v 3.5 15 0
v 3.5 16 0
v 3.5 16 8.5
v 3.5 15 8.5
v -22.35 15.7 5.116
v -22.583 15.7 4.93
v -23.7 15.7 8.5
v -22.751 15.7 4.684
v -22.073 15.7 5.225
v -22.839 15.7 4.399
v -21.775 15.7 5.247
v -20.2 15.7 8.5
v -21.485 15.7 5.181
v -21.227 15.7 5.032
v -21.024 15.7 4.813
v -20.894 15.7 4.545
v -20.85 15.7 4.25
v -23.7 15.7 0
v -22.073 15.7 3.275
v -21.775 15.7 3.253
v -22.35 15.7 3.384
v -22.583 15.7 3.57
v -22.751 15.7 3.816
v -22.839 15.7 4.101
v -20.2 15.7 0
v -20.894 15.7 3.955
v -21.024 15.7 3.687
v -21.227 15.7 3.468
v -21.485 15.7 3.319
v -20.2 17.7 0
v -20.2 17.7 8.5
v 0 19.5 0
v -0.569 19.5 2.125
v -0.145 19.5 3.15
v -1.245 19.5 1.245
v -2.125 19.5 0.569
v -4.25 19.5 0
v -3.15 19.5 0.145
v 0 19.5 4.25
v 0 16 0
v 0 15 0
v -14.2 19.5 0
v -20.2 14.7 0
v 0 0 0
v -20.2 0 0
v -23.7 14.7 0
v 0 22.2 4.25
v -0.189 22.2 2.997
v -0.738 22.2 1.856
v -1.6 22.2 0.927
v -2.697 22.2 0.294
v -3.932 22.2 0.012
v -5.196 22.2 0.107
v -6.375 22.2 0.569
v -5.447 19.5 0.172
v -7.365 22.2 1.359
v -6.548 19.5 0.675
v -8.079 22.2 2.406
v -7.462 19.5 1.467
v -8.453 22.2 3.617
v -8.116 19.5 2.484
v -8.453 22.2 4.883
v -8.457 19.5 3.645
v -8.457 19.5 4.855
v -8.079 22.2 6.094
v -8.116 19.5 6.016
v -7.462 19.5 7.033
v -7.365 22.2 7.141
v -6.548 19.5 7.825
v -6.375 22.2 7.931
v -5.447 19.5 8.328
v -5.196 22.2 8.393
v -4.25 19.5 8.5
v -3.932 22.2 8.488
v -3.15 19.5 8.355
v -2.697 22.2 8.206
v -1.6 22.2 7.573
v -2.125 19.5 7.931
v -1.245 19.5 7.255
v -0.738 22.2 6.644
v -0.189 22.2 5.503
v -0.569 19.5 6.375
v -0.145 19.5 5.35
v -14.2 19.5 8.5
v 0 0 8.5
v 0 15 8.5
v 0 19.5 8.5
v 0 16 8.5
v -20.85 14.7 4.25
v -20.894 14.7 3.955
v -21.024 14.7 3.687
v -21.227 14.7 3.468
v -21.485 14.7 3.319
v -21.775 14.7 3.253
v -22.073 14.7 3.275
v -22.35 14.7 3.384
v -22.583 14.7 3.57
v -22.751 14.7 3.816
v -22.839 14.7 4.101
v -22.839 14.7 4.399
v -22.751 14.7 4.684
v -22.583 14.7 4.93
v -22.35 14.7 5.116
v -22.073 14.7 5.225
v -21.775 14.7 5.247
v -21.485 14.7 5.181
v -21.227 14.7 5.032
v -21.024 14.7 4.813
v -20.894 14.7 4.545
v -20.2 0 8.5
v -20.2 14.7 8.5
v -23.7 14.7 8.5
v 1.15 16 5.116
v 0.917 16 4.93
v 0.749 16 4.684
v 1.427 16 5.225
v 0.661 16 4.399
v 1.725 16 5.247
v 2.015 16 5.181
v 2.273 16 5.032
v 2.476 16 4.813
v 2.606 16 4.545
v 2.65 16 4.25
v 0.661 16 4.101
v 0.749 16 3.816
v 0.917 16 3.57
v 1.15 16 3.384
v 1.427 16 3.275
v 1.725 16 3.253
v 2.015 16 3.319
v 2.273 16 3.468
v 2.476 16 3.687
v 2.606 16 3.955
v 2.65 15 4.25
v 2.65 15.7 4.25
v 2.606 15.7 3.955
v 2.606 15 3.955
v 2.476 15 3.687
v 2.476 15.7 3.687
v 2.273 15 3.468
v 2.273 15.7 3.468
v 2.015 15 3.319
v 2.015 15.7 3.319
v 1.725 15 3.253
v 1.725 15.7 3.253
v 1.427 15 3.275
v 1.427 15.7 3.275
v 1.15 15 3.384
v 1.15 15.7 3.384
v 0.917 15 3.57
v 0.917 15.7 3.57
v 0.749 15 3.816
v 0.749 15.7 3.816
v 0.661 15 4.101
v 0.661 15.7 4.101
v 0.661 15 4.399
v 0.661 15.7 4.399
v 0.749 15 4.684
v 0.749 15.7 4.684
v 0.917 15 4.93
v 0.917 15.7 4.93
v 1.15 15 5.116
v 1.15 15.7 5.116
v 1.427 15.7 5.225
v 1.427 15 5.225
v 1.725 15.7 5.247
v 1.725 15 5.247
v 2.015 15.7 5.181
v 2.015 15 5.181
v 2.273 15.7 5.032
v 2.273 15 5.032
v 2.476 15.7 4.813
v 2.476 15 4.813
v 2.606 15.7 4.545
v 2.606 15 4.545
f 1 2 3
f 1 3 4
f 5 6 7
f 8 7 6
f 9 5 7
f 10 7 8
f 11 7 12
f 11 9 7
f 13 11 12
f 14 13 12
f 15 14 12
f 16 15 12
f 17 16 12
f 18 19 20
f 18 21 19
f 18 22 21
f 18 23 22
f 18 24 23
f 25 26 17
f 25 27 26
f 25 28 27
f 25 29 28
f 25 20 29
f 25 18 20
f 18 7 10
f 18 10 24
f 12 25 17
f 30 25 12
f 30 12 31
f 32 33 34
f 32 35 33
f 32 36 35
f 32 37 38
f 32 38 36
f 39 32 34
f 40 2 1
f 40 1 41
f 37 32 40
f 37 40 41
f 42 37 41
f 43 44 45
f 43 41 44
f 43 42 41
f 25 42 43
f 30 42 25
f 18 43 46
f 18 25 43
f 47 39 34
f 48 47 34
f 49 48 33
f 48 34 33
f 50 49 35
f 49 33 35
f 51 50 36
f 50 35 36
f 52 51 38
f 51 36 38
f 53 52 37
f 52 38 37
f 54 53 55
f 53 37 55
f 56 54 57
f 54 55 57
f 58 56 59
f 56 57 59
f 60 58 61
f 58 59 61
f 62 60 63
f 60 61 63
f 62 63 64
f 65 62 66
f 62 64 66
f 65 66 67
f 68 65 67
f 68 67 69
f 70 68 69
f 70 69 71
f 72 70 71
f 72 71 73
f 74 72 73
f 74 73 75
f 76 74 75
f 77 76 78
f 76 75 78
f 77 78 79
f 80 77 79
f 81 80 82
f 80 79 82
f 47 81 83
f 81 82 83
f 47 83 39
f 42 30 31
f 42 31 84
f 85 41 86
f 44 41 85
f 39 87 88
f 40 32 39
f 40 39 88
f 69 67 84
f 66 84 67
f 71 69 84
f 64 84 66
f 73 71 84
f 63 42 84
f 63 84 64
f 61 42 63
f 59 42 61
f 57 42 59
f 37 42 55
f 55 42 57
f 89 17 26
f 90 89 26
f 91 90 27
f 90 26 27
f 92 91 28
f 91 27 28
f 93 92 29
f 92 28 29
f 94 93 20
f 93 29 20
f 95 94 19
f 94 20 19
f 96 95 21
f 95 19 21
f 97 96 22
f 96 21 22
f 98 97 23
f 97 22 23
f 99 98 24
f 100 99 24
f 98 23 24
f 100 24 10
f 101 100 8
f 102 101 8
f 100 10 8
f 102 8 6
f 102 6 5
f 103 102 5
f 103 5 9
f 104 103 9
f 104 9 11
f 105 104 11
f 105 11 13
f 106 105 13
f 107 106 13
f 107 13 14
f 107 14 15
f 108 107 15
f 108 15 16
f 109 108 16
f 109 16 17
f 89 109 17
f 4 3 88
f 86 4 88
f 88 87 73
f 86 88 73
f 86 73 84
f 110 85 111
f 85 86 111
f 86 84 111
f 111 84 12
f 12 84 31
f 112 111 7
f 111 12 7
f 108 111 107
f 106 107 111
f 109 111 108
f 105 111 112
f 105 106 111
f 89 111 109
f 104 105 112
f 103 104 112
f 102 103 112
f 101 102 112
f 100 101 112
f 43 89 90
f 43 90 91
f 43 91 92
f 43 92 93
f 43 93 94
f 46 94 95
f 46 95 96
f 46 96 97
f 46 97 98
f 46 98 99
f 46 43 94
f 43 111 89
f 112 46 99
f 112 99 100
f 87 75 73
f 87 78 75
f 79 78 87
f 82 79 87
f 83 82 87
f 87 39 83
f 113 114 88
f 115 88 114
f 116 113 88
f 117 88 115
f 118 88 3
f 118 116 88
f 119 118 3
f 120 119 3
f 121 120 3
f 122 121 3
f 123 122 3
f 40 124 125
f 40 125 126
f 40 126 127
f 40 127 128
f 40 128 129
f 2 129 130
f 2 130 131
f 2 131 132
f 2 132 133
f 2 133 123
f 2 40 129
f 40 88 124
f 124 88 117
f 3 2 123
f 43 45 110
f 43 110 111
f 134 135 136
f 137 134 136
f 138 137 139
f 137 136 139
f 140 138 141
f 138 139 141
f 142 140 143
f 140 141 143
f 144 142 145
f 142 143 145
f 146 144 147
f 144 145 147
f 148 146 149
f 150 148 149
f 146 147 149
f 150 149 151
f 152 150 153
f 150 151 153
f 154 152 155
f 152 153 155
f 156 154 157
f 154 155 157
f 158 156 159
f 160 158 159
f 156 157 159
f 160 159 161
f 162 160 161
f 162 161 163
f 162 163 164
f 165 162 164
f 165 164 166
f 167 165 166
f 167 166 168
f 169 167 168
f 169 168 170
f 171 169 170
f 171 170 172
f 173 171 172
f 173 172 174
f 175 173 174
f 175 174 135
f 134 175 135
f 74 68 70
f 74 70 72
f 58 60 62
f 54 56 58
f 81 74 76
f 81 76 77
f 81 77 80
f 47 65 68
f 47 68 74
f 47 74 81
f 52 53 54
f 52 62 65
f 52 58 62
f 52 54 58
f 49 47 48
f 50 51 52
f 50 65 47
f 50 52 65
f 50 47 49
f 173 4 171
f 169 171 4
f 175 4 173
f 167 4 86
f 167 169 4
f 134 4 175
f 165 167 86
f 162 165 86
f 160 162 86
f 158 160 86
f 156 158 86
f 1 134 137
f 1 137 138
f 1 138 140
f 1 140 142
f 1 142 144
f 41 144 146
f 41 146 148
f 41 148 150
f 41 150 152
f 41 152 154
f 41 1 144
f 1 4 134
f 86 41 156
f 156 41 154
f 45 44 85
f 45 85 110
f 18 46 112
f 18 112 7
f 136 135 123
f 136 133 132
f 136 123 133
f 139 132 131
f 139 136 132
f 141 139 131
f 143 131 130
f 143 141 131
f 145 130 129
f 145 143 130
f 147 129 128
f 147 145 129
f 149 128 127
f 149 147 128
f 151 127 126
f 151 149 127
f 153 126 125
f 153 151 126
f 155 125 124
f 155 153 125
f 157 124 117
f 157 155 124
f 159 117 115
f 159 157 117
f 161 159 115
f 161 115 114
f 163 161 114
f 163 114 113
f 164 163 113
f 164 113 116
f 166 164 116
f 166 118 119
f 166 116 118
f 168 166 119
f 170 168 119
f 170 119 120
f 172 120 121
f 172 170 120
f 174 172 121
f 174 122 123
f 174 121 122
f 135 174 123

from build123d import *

# Parameters (mm, degrees)
BOSS_EXTRUDE1_DEPTH     = 8.5
SKETCH2_R               = 4.25
BOSS_EXTRUDE2_DEPTH     = 2.7
SKETCH3_R               = 1
CUT_EXTRUDE1_DEPTH      = 7.5
CUT_EXTRUDE1_DEPTH_BACK = 16.7


with BuildPart() as part:
    # Sketch1 → Boss-Extrude1 (new body)
    with BuildSketch(Plane.XY):
        Polygon((0, 0), (-20.2, 0), (-20.2, 14.7), (-23.7, 14.7), (-23.7, 15.7), (-20.2, 15.7), (-20.2, 17.7), (-14.2, 19.5), (0, 19.5), (0, 16), (3.5, 16), (3.5, 15), (0, 15), align=None)
    extrude(amount=BOSS_EXTRUDE1_DEPTH)

    # Sketch2 → Boss-Extrude2 (add)
    with BuildSketch(Plane(origin=(0, 19.5, 0), x_dir=(1, 0, 0), z_dir=(0, 1, 0))):
        with Locations((-4.25, -4.25)):
            Circle(SKETCH2_R)
    extrude(amount=BOSS_EXTRUDE2_DEPTH)

    # Sketch3 → Cut-Extrude1 (cut, two sides)
    with BuildSketch(Plane(origin=(0, 15.7, 0), x_dir=(1, 0, 0), z_dir=(0, 1, 0))) as cut_extrude1_sk:
        with Locations((-21.85, -4.25)):
            Circle(SKETCH3_R)
        with Locations((1.65, -4.25)):
            Circle(SKETCH3_R)
    extrude(amount=CUT_EXTRUDE1_DEPTH, mode=Mode.SUBTRACT)
    extrude(cut_extrude1_sk.sketch, amount=-CUT_EXTRUDE1_DEPTH_BACK, mode=Mode.SUBTRACT)


solid = part.part
